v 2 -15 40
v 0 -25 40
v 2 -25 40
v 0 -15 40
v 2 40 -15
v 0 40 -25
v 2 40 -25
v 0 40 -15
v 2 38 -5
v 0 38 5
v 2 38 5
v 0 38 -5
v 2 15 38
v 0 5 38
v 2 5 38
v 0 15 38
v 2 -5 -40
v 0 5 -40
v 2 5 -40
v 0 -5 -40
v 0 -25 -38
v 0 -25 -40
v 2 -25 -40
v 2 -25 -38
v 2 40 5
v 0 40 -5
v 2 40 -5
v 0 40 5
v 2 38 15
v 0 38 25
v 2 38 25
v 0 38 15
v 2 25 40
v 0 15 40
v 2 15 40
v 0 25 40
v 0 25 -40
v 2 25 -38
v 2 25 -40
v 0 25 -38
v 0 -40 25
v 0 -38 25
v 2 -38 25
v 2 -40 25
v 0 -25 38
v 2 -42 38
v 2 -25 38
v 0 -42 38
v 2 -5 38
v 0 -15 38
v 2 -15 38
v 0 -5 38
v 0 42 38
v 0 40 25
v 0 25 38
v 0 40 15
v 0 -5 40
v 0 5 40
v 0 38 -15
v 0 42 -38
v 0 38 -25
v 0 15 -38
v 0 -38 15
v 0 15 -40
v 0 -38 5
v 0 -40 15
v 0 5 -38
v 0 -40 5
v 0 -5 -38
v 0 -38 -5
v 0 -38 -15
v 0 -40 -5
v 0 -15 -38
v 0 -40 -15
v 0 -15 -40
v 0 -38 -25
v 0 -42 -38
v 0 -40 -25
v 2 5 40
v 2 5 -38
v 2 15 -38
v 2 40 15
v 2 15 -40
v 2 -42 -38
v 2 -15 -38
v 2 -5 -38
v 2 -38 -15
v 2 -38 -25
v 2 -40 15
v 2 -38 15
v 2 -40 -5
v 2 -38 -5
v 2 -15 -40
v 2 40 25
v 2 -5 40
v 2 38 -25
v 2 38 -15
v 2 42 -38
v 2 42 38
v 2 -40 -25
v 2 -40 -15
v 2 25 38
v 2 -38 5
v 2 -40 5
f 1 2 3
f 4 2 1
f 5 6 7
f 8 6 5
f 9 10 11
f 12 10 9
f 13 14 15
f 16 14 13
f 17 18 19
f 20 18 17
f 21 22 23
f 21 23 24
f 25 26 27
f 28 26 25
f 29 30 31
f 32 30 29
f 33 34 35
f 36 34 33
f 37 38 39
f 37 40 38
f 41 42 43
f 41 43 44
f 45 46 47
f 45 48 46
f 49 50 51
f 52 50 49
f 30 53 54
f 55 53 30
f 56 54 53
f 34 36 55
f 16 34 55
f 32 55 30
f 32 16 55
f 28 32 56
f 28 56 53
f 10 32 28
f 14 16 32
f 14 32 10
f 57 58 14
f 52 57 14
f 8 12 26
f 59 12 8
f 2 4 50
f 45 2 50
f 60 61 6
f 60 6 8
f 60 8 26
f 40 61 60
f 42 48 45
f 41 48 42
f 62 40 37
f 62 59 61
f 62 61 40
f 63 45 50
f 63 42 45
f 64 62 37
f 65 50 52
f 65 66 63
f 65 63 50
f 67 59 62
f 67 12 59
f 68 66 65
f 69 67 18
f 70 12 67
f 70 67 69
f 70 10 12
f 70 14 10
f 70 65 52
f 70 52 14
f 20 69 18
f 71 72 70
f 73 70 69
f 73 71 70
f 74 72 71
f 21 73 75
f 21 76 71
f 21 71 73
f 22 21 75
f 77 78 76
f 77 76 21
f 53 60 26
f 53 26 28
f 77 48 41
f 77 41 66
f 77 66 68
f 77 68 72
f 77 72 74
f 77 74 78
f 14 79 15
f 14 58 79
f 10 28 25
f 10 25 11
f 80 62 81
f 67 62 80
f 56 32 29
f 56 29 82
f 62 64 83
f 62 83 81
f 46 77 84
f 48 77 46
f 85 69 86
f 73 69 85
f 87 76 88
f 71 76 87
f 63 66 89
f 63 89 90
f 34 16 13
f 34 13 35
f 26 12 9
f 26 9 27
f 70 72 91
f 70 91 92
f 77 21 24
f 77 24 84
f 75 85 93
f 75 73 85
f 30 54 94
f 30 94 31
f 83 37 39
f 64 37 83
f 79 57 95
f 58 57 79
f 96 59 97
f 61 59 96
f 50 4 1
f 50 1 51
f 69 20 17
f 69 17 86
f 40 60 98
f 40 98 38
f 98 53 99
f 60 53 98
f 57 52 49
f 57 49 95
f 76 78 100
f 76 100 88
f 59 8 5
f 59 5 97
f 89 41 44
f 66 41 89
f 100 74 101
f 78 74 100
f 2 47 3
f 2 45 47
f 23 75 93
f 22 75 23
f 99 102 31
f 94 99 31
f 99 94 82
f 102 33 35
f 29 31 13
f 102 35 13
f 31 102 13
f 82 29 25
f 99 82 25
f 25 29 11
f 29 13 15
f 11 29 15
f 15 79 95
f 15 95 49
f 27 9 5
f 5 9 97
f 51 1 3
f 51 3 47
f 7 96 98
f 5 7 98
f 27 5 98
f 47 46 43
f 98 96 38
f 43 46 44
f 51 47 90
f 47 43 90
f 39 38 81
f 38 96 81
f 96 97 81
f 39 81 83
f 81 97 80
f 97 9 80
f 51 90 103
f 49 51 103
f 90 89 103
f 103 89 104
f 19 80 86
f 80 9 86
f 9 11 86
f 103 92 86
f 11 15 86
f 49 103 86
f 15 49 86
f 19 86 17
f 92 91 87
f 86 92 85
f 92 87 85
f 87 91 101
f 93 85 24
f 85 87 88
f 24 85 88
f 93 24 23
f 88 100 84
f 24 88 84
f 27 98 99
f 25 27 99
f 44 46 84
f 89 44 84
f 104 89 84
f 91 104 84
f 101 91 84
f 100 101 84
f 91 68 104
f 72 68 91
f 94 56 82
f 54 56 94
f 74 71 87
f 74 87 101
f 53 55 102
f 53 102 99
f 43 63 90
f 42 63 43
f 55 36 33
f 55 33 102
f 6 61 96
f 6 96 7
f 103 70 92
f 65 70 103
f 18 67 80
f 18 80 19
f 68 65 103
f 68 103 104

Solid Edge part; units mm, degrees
sketch "Sketch1" plane through (0, 0, 0) normal (1, 0, 0) x (0, 1, 0)
  line L0 (42, 40) -> (42, -40)
  line L1 (42, -40) -> (-42, -40)
  line L2 (-42, -40) -> (-42, 40)
  line L3 (-42, 40) -> (42, 40)
extrude "Protrusion1" add sketch "Sketch1" along normal blind 2
sketch "Sketch2" plane through (0, 0, 0) normal (1, 0, 0) x (0, 1, 0)
  line L0 (-42, 38) -> (-25, 38)
  line L1 (-25, 38) -> (-25, 40)
  line L2 (-25, 40) -> (-42, 40)
  line L3 (-42, 40) -> (-42, 38)
  line L4 (-5, 40) -> (-15, 40)
  line L5 (-15, 40) -> (-15, 38)
  line L6 (-15, 38) -> (-5, 38)
  line L7 (-5, 38) -> (-5, 40)
  line L8 (15, 40) -> (5, 40)
  line L9 (5, 40) -> (5, 38)
  line L10 (5, 38) -> (15, 38)
  line L11 (15, 38) -> (15, 40)
  line L12 (42, 40) -> (25, 40)
  line L13 (25, 40) -> (25, 38)
  line L14 (25, 38) -> (42, 38)
  line L15 (42, 38) -> (42, 40)
  line L16 (38, 25) -> (38, 15)
  line L17 (38, 15) -> (40, 15)
  line L18 (40, 15) -> (40, 25)
  line L19 (40, 25) -> (38, 25)
  line L20 (38, 5) -> (38, -5)
  line L21 (38, -5) -> (40, -5)
  line L22 (40, -5) -> (40, 5)
  line L23 (40, 5) -> (38, 5)
  line L24 (38, -15) -> (38, -25)
  line L25 (38, -25) -> (40, -25)
  line L26 (40, -25) -> (40, -15)
  line L27 (40, -15) -> (38, -15)
  line L28 (42, -38) -> (25, -38)
  line L29 (25, -38) -> (25, -40)
  line L30 (25, -40) -> (42, -40)
  line L31 (42, -40) -> (42, -38)
  line L32 (15, -38) -> (5, -38)
  line L33 (5, -38) -> (5, -40)
  line L34 (5, -40) -> (15, -40)
  line L35 (15, -40) -> (15, -38)
  line L36 (-5, -38) -> (-15, -38)
  line L37 (-15, -38) -> (-15, -40)
  line L38 (-15, -40) -> (-5, -40)
  line L39 (-5, -40) -> (-5, -38)
  line L40 (-25, -38) -> (-42, -38)
  line L41 (-42, -38) -> (-42, -40)
  line L42 (-42, -40) -> (-25, -40)
  line L43 (-25, -40) -> (-25, -38)
  line L44 (-38, -25) -> (-38, -15)
  line L45 (-38, -15) -> (-40, -15)
  line L46 (-40, -15) -> (-40, -25)
  line L47 (-40, -25) -> (-38, -25)
  line L48 (-38, 5) -> (-40, 5)
  line L49 (-40, 5) -> (-40, -5)
  line L50 (-40, -5) -> (-38, -5)
  line L51 (-38, -5) -> (-38, 5)
  line L52 (-40, 15) -> (-38, 15)
  line L53 (-38, 15) -> (-38, 25)
  line L54 (-38, 25) -> (-40, 25)
  line L55 (-40, 25) -> (-40, 15)
  dimension "D1" = 17
  dimension "D2" = 2
  dimension "D3" = 17
  dimension "D4" = 2
  dimension "D5" = 17
  dimension "D6" = 2
  dimension "D7" = 17
  dimension "D8" = 2
  dimension "D9" = 10
  dimension "D10" = 2
  dimension "D11" = 10
  dimension "D12" = 2
  dimension "D13" = 10
  dimension "D14" = 2
  dimension "D15" = 2
  dimension "D16" = 10
  dimension "D17" = 2
  dimension "D18" = 10
  dimension "D19" = 2
  dimension "D20" = 10
  dimension "D21" = 2
  dimension "D22" = 10
  dimension "D23" = 2
  dimension "D24" = 10
  dimension "D25" = 2
  dimension "D26" = 10
  dimension "D27" = 10
  dimension "D28" = 2
  dimension "D29" = 10
  dimension "D30" = 10
  dimension "D31" = 10
  dimension "D32" = 15
  dimension "D33" = 2
  dimension "D34" = 2
  dimension "D35" = 2
  dimension "D36" = 15
  dimension "D37" = 10
  dimension "D38" = 10
  dimension "D39" = 10
  dimension "D40" = 10
  dimension "D41" = 10
  dimension "D42" = 2
  dimension "D43" = 15
  dimension "D44" = 2
  dimension "D45" = 10
  dimension "D46" = 15
  dimension "D47" = 2
  dimension "D48" = 10
extrude "Cutout1" cut sketch "Sketch2" along normal blind 2
properties material "Acrylic, high impact grade"
